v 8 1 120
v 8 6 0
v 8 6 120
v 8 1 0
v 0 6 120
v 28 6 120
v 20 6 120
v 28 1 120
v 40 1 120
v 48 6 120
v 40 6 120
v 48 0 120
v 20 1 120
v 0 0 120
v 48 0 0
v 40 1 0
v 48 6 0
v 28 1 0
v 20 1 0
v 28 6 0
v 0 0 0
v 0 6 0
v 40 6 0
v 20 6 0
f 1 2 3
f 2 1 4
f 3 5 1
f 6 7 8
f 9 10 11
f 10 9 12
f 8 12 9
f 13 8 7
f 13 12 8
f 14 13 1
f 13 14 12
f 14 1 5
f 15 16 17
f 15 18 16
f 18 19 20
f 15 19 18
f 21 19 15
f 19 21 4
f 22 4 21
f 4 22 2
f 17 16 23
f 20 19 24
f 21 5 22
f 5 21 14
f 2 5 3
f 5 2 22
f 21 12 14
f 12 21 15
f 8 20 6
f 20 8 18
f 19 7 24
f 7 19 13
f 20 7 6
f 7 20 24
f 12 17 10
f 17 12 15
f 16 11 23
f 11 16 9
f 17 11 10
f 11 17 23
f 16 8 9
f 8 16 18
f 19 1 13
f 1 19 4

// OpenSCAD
//// CONFIGURATION In mm////
width=40;
baseThickness=1;
supportGap=20;
supportWidth=8;
length=120;
supportThickness=6;

//// DERIVED VARS ////

//difference() {
  union() {
    translate([0,0,0]) {
      cube([width,baseThickness,length],center=false);
    }
    for(x =[0 : 1 : width/supportGap]) {
      translate([x*supportGap,0,0]) {
        cube([supportWidth,supportThickness,length],center=false);  
      }
    }
//    translate([supportLength-deskDepth,deskThickness,0]) {
//        cube([deskDepth,supportThickness,width],center=false); 
//    } 
  }
//  union() {
//    translate([x*spacing+(spacing/2),height/2,0])
//      cylinder(h=width+.1,d=shaftSize,center=false);    
//  }

//}gt
